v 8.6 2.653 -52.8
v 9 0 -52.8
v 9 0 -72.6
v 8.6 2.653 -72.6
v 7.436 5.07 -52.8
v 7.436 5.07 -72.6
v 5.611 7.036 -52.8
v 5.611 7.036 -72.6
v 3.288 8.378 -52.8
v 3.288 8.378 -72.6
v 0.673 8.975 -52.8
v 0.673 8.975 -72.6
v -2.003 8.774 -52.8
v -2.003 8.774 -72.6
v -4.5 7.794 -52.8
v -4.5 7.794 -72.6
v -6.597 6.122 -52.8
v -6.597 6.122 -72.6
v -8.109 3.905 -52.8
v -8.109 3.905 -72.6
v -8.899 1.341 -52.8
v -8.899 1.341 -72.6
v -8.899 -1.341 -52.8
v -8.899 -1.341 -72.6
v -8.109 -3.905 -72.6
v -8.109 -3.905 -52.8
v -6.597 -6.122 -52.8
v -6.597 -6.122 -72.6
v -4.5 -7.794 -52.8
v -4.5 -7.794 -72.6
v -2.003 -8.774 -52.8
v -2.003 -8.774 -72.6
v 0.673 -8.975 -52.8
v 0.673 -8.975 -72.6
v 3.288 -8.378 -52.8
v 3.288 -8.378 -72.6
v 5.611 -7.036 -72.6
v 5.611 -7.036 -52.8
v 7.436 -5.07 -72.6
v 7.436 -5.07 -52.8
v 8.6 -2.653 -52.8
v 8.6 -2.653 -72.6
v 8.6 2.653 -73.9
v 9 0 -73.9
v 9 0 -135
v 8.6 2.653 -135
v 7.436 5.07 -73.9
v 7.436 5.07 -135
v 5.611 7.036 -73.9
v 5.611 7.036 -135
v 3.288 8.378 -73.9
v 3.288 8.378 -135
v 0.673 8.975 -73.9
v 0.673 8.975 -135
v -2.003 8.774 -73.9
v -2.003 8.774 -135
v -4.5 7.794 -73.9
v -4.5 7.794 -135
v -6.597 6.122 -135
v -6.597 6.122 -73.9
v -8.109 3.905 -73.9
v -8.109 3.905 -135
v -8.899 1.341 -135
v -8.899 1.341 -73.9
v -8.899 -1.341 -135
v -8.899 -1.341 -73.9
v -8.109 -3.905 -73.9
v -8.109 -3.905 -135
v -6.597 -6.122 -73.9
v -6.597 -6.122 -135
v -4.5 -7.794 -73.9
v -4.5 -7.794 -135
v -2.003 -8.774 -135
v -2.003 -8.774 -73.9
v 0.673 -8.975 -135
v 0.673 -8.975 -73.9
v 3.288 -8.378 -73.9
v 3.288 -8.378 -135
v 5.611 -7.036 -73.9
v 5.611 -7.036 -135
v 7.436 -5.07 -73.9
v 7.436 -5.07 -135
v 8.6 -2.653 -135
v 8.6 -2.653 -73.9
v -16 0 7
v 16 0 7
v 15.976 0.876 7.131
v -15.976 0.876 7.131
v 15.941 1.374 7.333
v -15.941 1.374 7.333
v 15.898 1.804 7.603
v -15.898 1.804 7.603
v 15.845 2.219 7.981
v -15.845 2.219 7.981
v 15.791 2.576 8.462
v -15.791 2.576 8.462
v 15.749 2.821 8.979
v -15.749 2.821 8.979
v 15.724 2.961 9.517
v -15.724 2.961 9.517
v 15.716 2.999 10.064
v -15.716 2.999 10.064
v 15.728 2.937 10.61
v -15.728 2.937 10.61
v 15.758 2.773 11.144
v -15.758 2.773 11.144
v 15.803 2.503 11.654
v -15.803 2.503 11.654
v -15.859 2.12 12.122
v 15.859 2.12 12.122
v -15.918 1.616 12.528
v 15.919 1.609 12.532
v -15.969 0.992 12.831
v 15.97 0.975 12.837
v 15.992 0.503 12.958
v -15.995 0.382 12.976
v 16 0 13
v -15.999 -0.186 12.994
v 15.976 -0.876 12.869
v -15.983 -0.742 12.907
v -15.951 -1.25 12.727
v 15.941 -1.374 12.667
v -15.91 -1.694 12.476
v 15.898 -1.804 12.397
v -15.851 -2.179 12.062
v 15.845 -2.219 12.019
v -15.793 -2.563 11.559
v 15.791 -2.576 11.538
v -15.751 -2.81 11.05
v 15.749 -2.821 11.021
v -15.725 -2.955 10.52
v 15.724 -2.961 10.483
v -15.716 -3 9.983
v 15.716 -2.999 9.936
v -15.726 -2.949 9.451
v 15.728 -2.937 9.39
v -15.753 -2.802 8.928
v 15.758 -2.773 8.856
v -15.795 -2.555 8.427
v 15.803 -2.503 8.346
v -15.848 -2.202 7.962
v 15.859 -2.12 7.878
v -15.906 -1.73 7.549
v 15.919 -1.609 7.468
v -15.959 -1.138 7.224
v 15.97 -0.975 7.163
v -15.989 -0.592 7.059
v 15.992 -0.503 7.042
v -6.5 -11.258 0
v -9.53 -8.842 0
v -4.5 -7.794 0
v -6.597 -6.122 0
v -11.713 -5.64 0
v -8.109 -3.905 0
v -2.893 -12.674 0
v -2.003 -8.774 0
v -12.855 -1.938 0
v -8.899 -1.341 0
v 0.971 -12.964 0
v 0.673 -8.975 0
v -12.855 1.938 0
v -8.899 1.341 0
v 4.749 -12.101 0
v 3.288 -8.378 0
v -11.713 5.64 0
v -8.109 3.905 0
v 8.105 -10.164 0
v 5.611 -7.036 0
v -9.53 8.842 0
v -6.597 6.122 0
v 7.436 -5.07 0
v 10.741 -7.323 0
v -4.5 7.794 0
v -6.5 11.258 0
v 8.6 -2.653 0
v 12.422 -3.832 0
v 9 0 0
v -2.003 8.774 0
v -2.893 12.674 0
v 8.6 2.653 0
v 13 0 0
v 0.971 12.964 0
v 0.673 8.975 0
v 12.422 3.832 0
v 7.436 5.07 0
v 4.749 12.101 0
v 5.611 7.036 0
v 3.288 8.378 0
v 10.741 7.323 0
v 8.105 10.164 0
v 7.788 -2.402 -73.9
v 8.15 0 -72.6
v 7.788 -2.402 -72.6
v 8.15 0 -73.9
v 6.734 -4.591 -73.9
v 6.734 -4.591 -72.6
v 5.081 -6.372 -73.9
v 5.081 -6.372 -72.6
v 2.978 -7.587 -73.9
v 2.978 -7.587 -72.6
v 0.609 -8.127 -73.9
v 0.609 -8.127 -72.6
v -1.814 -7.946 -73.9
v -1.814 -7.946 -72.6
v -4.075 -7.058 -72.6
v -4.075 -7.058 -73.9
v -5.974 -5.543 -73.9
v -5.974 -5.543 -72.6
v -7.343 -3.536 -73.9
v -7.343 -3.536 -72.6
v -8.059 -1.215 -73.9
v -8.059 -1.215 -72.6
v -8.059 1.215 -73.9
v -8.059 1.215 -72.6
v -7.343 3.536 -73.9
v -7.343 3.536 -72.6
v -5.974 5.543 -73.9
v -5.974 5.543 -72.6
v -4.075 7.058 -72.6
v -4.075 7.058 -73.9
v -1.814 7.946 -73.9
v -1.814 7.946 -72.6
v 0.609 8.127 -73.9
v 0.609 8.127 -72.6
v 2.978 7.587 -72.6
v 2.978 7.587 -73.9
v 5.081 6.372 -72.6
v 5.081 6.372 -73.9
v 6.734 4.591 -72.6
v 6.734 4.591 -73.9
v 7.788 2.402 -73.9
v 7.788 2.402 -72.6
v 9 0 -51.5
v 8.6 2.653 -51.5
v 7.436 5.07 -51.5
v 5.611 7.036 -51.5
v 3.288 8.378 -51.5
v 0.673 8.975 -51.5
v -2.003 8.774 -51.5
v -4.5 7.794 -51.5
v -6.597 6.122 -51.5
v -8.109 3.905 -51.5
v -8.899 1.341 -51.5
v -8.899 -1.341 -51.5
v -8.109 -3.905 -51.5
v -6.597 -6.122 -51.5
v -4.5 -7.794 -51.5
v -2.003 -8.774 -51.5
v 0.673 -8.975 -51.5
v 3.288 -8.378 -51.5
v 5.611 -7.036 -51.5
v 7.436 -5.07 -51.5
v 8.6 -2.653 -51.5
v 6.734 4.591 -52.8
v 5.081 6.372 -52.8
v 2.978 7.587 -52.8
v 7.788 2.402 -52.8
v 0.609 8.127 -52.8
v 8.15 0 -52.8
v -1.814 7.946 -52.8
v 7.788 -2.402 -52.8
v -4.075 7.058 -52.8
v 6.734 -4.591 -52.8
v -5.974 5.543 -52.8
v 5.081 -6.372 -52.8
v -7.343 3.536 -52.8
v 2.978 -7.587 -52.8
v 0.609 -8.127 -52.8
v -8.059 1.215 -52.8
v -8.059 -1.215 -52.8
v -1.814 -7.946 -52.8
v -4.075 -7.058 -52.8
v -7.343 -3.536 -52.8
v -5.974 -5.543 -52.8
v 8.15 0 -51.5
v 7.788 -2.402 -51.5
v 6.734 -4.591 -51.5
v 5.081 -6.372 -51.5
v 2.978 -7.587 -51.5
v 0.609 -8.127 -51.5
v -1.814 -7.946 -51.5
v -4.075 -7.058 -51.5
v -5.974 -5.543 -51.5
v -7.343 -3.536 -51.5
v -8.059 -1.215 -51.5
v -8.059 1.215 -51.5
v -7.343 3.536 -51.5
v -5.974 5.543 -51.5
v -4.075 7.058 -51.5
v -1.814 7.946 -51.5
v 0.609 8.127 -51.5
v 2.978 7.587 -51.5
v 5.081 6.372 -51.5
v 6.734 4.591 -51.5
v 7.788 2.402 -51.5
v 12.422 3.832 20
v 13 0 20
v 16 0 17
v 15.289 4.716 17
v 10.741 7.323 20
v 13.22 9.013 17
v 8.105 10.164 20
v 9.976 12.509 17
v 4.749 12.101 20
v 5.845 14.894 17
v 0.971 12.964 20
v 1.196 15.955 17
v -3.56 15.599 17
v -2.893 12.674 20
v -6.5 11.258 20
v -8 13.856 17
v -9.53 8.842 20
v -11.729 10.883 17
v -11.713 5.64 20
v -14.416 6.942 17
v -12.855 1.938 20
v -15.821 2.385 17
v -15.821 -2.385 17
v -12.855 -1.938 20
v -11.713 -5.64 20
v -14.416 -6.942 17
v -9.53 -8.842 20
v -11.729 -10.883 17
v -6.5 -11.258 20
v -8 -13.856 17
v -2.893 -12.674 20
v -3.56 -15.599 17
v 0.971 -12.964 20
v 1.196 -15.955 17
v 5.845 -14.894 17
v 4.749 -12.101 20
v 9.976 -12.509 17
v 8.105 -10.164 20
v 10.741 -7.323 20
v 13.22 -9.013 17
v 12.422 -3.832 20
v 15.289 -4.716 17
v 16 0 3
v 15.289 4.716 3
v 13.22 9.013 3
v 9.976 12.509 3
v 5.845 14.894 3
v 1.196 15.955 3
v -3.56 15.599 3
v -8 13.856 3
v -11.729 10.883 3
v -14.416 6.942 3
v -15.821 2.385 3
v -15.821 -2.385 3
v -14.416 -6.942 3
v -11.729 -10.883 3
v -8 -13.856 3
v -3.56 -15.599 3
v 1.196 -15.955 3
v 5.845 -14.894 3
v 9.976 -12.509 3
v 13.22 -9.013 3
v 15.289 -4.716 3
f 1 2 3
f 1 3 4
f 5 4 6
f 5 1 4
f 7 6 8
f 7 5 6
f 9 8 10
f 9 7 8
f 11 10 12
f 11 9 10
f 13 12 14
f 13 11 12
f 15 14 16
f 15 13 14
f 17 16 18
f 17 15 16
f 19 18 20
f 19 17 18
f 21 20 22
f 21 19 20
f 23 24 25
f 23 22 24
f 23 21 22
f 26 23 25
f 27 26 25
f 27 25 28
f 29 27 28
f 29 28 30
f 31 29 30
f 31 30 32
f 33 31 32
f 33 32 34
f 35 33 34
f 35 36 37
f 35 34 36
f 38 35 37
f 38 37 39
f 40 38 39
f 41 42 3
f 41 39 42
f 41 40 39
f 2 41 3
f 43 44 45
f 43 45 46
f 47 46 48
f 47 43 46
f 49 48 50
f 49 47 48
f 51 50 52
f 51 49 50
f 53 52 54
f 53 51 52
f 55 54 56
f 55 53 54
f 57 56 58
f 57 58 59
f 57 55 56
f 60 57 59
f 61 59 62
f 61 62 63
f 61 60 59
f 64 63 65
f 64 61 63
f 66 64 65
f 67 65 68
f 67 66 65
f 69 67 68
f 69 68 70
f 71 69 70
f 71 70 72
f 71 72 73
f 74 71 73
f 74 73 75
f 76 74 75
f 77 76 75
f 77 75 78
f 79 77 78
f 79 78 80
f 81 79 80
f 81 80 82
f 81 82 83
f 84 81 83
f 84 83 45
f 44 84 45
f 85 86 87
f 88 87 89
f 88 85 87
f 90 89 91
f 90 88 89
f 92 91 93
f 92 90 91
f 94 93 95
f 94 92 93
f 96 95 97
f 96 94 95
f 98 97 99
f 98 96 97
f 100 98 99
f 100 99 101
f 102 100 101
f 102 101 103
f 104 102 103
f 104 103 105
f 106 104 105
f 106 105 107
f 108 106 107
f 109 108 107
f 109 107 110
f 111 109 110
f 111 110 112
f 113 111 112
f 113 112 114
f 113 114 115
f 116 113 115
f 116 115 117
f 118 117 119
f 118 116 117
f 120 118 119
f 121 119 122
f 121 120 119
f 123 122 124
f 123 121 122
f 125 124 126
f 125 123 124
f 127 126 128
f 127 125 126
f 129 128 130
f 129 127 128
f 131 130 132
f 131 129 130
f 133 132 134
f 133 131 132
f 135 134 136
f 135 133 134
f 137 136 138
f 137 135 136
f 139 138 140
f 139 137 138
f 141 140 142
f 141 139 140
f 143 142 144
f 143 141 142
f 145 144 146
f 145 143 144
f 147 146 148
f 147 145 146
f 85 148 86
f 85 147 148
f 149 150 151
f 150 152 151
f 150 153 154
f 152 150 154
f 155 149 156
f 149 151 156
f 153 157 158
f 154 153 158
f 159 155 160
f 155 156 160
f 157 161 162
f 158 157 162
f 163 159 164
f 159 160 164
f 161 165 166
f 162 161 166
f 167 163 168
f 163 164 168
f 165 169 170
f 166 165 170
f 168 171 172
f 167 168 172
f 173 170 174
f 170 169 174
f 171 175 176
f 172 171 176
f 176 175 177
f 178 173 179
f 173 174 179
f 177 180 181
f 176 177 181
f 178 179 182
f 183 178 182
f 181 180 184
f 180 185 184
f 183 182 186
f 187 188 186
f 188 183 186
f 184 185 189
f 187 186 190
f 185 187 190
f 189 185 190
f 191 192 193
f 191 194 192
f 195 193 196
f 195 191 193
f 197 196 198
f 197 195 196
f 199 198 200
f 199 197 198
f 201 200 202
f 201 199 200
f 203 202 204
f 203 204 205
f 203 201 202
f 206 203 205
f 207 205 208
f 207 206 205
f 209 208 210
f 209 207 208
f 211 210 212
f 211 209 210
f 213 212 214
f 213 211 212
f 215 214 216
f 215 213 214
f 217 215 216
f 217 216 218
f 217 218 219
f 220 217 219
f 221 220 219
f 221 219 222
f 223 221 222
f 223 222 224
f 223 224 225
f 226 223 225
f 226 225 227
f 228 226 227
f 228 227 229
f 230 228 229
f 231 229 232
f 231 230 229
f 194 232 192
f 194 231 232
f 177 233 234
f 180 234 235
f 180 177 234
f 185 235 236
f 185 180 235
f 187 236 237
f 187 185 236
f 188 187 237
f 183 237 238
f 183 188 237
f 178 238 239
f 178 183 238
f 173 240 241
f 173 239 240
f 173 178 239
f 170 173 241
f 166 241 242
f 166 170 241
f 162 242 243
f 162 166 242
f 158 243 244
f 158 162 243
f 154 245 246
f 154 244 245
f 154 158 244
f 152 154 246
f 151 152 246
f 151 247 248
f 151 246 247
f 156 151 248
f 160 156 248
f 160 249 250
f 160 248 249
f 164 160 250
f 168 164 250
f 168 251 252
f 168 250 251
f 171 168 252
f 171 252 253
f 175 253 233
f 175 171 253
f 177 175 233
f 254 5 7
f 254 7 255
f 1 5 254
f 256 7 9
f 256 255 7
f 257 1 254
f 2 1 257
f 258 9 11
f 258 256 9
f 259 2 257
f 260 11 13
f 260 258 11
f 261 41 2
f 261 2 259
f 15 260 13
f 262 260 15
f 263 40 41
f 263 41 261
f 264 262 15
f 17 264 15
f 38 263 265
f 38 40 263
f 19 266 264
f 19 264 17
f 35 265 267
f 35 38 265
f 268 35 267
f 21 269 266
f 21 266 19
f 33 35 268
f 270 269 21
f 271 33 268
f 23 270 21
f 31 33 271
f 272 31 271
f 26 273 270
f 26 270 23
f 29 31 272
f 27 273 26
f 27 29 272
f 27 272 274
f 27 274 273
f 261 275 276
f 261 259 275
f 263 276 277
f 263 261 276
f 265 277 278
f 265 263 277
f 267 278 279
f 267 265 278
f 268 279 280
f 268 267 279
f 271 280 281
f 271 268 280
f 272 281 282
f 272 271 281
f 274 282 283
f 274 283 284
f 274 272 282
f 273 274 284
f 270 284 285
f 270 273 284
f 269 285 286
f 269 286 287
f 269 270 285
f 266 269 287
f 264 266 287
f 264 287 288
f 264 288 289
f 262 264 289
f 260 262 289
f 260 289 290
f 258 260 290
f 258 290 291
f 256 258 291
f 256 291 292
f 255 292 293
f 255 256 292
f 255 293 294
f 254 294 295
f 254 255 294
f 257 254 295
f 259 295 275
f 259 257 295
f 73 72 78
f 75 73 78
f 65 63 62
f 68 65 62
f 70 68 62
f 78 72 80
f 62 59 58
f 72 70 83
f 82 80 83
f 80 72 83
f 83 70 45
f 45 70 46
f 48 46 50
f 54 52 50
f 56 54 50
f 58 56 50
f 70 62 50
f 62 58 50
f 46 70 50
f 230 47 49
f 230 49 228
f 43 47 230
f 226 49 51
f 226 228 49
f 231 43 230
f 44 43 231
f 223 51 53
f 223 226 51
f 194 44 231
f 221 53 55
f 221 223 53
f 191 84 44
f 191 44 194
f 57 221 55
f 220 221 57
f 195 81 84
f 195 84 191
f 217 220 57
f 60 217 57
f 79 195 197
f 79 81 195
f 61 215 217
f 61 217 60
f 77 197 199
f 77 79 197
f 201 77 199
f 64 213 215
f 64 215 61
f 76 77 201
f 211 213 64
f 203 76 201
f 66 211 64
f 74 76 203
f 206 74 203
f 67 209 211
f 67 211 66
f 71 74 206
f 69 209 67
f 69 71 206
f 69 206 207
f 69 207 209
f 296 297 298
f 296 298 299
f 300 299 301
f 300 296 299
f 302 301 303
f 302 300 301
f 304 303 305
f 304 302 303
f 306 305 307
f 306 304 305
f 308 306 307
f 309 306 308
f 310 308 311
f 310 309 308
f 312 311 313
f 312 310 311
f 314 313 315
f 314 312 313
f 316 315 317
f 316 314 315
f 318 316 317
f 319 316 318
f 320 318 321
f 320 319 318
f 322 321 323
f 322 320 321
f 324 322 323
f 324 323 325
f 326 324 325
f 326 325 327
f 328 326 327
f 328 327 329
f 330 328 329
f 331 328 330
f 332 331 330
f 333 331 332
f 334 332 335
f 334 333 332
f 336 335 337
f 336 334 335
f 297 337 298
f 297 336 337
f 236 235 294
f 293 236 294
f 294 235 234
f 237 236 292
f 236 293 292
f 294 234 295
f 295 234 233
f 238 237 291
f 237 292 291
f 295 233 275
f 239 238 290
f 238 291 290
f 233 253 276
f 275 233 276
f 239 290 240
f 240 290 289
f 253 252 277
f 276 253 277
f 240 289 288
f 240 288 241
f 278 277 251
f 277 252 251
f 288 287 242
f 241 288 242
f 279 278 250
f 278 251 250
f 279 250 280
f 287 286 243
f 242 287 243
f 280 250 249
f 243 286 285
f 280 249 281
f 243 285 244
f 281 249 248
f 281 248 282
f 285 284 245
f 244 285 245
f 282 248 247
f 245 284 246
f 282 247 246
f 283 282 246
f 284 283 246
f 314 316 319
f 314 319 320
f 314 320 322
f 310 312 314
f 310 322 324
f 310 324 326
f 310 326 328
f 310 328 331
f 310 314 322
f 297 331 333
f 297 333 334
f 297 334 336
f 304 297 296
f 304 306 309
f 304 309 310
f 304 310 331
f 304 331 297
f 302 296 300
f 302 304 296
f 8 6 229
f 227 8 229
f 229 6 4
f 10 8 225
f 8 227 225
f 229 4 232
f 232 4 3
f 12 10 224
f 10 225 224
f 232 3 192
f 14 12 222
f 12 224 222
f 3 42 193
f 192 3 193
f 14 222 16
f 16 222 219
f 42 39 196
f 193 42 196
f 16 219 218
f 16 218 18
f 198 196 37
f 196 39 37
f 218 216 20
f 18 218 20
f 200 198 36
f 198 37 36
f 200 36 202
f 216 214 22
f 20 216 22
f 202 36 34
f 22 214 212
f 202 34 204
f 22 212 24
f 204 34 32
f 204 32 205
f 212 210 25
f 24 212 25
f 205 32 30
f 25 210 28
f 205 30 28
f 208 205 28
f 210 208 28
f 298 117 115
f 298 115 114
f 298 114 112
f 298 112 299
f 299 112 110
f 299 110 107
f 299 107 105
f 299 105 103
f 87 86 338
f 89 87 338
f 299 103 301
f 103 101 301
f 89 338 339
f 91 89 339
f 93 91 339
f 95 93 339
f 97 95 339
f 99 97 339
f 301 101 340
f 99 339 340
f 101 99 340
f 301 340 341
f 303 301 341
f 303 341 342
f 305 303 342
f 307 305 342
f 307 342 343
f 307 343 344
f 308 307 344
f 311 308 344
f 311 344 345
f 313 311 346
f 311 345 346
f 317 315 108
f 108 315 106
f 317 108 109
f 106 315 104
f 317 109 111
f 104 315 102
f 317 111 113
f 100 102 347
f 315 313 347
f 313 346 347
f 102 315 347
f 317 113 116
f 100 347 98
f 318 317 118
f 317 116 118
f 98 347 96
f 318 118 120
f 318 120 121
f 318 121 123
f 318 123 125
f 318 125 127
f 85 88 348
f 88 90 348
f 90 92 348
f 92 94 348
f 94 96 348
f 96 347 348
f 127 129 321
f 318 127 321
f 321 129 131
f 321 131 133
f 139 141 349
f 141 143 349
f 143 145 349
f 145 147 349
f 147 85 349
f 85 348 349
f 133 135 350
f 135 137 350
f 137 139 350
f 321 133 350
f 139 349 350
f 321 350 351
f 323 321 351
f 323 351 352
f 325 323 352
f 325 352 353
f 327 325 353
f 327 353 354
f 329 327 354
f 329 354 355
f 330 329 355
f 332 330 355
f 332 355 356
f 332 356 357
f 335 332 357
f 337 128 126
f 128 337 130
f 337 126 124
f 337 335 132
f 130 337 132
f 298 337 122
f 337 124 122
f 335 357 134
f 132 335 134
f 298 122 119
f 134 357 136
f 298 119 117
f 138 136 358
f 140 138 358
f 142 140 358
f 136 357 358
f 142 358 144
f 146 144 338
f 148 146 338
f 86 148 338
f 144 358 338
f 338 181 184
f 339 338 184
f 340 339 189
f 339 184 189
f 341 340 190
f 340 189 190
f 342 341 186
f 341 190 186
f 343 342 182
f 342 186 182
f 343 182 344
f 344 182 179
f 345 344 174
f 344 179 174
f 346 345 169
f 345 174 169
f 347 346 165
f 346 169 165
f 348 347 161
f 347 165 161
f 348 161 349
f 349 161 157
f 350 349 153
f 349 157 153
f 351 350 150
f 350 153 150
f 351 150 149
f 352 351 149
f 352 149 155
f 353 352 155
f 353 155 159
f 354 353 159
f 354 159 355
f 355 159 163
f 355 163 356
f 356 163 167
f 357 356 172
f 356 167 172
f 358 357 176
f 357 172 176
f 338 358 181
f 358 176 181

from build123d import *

# Parameters (mm, degrees)
SCHIZZO1_R                    = 16
ESTRUSIONE_ESTRUSIONE1_DEPTH  = 20
SMUSSO1_SIZE                  = 3
TAGLIO_ESTRUSIONE1_DEPTH      = 31.199337741
TAGLIO_ESTRUSIONE1_DEPTH_BACK = 31.199337741
SCHIZZO2_R                    = 3
SCHIZZO3_R                    = 9
ESTRUSIONE_ESTRUSIONE2_DEPTH  = 135
SCHIZZO4_W                    = 1.3
SCHIZZO4_H                    = 0.85


with BuildPart() as part:
    # Schizzo1 → Estrusione-Estrusione1 (new body)
    with BuildSketch(Plane.XY):
        Circle(SCHIZZO1_R)
    extrude(amount=ESTRUSIONE_ESTRUSIONE1_DEPTH)

    # Smusso1
    smusso1_edges = [part.edges().sort_by_distance(p)[0] for p in [
        (-16, 0, 0),
        (-16, 0, 20),
    ]]
    chamfer(smusso1_edges, length=SMUSSO1_SIZE)

    # Schizzo2 → Taglio-Estrusione1 (cut, two sides: drawn at the far end of the back side and taken through both)
    with BuildSketch(Plane(origin=(0, 0, 0), x_dir=(0, 0, -1), z_dir=(1, 0, 0)).offset(-TAGLIO_ESTRUSIONE1_DEPTH_BACK)):
        with Locations((-10, 0)):
            Circle(SCHIZZO2_R)
    extrude(amount=TAGLIO_ESTRUSIONE1_DEPTH + TAGLIO_ESTRUSIONE1_DEPTH_BACK, mode=Mode.SUBTRACT)

    # Schizzo3 → Estrusione-Estrusione2 (add)
    with BuildSketch(Plane.XY):
        Circle(SCHIZZO3_R)
    extrude(amount=-ESTRUSIONE_ESTRUSIONE2_DEPTH)

    # Schizzo4 → Taglia-Rivoluzione1 (revolve, cut)
    with BuildSketch(Plane(origin=(0, 0, 0), x_dir=(0, 0, -1), z_dir=(1, 0, 0)), mode=Mode.PRIVATE) as taglia_rivoluzione1_sk:
        with Locations((52.15, 8.575)):
            Rectangle(SCHIZZO4_W, SCHIZZO4_H)
        with Locations((73.25, 8.575)):
            Rectangle(SCHIZZO4_W, SCHIZZO4_H)
    revolve(taglia_rivoluzione1_sk.sketch.rotate(Axis((0, 0, 0), (0, 0, -1)), 90), axis=Axis((0, 0, 0), (0, 0, -1)), mode=Mode.SUBTRACT)


solid = part.part
